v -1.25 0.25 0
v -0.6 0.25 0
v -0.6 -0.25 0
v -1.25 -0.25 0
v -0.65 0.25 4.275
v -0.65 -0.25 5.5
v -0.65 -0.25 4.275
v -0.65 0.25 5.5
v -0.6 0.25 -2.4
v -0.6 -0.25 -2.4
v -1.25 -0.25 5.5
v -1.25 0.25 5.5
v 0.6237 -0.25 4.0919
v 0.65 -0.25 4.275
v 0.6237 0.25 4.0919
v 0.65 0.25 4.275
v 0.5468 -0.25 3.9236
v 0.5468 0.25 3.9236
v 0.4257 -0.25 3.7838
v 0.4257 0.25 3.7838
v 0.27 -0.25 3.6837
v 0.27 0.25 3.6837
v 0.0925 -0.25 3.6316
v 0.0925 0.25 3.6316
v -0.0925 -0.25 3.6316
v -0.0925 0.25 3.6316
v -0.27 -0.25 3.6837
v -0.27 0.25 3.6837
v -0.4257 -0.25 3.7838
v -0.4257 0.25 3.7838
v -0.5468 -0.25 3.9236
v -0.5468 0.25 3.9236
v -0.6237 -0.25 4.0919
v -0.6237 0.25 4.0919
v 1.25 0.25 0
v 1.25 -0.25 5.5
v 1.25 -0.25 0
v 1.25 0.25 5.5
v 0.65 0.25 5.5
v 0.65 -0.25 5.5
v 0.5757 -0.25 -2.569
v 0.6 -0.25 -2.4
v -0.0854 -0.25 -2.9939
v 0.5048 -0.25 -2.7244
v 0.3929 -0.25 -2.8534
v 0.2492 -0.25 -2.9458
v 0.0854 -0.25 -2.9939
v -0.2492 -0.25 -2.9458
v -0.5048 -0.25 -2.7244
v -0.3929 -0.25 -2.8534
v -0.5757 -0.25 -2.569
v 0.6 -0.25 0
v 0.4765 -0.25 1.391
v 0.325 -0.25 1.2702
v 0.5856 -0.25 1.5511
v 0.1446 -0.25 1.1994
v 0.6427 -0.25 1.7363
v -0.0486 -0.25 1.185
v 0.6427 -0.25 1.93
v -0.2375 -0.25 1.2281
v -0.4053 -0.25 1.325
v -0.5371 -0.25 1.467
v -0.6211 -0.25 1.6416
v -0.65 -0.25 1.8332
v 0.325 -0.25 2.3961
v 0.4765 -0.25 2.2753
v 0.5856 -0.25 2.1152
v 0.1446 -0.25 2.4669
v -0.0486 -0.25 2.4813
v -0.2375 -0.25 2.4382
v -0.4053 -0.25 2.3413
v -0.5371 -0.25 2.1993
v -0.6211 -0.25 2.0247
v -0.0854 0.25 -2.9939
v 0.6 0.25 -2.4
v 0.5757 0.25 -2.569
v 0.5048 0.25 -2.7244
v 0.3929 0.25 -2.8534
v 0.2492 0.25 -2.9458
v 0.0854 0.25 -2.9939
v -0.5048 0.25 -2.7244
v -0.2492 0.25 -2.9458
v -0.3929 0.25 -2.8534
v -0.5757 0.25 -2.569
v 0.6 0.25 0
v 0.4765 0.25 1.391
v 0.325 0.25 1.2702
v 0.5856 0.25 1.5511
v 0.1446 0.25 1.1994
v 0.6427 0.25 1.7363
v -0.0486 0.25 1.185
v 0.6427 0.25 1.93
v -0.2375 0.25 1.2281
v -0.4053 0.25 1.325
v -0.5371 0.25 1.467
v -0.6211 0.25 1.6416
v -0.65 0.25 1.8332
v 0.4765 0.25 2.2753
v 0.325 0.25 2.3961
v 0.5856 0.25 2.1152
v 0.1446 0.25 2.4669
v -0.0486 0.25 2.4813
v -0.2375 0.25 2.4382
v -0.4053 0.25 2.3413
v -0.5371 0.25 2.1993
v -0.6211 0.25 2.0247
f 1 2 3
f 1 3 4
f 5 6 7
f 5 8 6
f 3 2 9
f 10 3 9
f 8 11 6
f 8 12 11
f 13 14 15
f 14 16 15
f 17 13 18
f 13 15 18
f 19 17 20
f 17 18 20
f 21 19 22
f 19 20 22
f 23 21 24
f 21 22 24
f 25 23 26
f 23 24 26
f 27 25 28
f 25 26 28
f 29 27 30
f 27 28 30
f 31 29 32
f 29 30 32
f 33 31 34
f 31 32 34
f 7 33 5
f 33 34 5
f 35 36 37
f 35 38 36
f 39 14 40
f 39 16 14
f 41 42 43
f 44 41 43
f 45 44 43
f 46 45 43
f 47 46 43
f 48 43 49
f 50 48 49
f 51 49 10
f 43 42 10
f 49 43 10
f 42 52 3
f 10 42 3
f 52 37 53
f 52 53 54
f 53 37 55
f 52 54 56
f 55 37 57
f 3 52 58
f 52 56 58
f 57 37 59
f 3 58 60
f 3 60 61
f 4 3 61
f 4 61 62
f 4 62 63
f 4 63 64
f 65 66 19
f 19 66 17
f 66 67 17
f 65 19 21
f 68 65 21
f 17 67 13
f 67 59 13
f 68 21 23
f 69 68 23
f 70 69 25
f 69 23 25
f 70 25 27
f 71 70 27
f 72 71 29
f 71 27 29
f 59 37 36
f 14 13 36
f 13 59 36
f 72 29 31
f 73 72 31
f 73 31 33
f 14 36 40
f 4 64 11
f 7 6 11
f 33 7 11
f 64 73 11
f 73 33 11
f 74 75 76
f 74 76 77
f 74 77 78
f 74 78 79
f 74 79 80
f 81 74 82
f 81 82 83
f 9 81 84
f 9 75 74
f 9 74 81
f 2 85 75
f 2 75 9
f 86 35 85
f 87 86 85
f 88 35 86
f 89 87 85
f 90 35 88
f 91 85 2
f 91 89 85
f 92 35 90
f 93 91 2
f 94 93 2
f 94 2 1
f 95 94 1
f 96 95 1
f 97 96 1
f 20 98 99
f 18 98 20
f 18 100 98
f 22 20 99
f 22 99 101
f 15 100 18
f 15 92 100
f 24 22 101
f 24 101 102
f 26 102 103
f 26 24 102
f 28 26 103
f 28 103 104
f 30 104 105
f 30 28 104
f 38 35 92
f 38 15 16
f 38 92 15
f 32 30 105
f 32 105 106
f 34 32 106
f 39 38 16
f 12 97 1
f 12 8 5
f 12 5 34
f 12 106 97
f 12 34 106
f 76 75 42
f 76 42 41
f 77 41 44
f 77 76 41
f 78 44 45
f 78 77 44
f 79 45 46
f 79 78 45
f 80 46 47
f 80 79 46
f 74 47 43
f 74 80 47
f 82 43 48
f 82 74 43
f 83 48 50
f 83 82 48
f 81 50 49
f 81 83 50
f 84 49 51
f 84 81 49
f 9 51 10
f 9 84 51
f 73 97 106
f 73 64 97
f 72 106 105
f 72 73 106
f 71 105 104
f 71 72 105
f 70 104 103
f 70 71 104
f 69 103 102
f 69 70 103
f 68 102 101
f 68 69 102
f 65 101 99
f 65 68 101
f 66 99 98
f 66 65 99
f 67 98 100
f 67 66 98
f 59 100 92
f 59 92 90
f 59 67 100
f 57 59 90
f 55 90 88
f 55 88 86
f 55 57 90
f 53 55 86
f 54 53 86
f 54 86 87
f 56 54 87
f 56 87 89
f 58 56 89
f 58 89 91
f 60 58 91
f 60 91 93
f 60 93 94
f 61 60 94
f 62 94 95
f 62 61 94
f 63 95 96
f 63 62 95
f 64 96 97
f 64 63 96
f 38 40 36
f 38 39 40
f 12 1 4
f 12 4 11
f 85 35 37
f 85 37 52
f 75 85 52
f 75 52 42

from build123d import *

# Parameters (mm, degrees)
SKETCH_R  = 0.65
PAD_DEPTH = 0.25


with BuildPart() as part:
    # Sketch → Pad (new body, symmetric)
    with BuildSketch(Plane(origin=(0, 0, 0), x_dir=(-1, 0, 0), z_dir=(0, 1, 0))):
        with BuildLine():
            Line((-1.25, 5.5), (-1.25, 0))
            Line((-1.25, 0), (-0.6, 0))
            Line((-0.6, 0), (-0.6, -2.4))
            ThreePointArc((-0.6, -2.4), (0, -3), (0.6, -2.4))
            Line((0.6, 0), (0.6, -2.4))
            Line((0.6, 0), (1.25, 0))
            Line((1.25, 0), (1.25, 5.5))
            Line((1.25, 5.5), (0.65, 5.5))
            Line((0.65, 5.5), (0.65, 4.275))
            ThreePointArc((-0.65, 4.275), (0, 3.625), (0.65, 4.275))
            Line((-0.65, 4.275), (-0.65, 5.5))
            Line((-0.65, 5.5), (-1.25, 5.5))
        make_face()
        with Locations((0, 1.83315)):
            Circle(SKETCH_R, mode=Mode.SUBTRACT)
    extrude(amount=PAD_DEPTH, both=True)


solid = part.part
